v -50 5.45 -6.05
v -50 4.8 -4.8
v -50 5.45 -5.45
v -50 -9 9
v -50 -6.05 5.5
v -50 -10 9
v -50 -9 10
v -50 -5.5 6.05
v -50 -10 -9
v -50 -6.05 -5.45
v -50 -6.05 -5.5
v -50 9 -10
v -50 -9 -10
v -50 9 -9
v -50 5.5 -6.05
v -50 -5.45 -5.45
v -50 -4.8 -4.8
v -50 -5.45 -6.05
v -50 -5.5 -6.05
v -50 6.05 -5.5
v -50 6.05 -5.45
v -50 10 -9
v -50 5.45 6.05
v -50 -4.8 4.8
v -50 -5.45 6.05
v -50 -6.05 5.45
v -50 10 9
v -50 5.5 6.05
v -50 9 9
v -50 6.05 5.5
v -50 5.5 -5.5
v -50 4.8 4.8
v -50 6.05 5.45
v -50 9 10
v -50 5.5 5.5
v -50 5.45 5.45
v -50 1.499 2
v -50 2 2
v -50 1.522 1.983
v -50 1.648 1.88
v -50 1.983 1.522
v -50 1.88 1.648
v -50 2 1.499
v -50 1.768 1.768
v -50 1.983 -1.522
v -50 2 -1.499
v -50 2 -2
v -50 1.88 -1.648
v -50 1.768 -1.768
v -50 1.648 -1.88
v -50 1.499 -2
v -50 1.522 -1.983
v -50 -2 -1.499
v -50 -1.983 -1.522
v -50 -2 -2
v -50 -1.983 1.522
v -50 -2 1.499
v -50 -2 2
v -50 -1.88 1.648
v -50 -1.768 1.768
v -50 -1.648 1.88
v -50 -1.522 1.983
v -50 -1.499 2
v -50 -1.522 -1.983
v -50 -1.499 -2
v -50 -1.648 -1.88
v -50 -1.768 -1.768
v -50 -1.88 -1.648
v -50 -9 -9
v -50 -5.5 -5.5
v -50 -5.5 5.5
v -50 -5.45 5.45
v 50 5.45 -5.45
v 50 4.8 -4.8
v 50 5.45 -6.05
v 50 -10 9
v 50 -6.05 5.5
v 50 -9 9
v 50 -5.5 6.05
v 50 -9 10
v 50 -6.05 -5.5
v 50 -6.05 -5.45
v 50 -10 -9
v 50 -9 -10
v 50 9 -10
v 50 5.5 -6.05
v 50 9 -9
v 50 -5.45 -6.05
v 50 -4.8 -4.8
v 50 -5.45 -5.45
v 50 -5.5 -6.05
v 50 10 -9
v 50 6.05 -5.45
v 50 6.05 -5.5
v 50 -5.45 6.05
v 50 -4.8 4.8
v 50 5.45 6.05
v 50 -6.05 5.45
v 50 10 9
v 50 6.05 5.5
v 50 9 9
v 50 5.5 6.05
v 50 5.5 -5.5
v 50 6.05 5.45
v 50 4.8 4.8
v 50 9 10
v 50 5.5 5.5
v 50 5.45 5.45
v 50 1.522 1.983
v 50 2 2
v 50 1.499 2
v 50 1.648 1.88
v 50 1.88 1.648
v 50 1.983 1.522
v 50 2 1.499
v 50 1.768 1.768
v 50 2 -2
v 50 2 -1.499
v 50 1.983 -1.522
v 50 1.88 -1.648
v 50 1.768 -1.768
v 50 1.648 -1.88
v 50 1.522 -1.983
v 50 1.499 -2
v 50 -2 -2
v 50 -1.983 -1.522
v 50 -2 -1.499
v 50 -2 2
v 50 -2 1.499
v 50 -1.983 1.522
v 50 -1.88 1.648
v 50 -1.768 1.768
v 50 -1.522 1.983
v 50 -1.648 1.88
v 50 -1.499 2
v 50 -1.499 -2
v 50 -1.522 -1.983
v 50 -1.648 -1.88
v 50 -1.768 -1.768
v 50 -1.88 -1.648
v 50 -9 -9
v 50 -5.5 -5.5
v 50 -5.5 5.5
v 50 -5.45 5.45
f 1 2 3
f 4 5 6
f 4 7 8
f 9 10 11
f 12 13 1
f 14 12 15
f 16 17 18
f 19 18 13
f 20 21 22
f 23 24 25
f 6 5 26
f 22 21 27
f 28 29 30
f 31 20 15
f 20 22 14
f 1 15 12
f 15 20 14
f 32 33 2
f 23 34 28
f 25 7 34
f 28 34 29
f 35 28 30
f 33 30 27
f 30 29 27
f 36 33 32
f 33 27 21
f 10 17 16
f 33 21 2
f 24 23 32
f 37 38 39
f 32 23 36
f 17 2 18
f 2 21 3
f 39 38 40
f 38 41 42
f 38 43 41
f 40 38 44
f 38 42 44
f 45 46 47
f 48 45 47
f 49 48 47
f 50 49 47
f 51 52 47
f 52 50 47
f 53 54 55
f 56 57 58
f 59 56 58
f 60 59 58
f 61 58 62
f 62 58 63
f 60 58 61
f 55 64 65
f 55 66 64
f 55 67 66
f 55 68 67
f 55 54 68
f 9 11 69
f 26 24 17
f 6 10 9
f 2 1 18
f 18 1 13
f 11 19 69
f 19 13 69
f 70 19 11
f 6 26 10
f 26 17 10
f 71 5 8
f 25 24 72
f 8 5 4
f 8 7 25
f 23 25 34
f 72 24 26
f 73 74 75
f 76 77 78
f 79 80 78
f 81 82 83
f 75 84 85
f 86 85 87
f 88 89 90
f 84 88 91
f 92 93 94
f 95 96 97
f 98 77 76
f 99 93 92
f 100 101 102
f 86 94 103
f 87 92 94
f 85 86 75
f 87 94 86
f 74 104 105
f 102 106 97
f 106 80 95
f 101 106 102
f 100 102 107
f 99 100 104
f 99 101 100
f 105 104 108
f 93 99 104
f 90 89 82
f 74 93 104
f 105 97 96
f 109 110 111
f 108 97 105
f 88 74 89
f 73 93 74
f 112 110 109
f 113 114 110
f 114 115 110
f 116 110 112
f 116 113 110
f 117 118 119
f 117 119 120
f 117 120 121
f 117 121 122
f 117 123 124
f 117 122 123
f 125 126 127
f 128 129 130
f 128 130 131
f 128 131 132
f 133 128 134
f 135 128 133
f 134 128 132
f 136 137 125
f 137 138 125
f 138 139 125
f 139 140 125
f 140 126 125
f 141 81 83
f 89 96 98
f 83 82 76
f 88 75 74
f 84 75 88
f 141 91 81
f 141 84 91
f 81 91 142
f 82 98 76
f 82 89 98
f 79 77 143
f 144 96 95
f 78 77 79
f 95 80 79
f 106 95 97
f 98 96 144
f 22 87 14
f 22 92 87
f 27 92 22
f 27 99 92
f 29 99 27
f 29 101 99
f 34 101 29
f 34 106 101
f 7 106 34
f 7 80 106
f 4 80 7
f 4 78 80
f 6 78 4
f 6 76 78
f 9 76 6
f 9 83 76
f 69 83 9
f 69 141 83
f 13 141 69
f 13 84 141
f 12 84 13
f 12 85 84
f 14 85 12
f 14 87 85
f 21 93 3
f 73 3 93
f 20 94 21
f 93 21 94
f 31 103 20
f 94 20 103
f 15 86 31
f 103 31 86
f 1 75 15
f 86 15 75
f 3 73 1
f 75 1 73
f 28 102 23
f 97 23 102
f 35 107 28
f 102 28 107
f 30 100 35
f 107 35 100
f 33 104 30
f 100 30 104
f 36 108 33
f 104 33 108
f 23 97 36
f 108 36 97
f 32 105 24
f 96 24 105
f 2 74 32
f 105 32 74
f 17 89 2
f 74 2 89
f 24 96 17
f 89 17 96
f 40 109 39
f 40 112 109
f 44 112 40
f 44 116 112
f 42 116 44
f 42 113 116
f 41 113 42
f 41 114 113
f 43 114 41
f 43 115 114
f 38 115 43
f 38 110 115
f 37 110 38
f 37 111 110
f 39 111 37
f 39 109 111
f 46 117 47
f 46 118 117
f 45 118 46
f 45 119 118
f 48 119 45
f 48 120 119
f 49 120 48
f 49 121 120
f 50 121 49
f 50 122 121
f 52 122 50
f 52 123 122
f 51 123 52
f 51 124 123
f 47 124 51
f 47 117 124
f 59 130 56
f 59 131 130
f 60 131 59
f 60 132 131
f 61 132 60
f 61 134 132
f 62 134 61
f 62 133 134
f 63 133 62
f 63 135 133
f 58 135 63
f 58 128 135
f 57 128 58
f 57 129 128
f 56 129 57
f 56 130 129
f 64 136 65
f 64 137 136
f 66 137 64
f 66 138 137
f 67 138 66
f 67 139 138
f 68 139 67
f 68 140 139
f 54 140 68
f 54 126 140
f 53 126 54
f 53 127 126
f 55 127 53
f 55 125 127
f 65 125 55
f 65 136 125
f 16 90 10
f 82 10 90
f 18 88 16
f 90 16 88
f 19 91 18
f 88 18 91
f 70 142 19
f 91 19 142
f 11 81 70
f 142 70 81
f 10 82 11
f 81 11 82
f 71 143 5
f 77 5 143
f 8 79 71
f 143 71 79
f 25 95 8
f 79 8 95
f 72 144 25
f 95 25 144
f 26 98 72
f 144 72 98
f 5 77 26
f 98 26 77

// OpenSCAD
// 2020 aluminium extrusion profile (20mm x 20mm), 100mm long
// Fixed structural connectivity: ensure one connected solid (no split/floating bodies)

$fn = 96;

// Requested overall size
cross_section_mm = 20.0;
length_mm        = 100.0;

// Profile details (approximate 2020)
slot_opening_mm   = 6.0;   // mouth width at outer face
slot_depth_mm     = 6.0;   // depth from outer face inward
slot_cavity_mm    = 11.0;  // wider internal cavity width
center_bore_d_mm  = 5.0;   // center through-bore
web_thickness_mm  = 2.0;   // keeps part connected
corner_relief_mm  = 1.0;   // small corner relief

// Overlap to guarantee physical connection (1-2mm as required)
overlap_mm = 1.2;

// Small numeric epsilon for robust booleans
eps = 0.05;

module extrusion2020(len=length_mm) {
    w = cross_section_mm;
    h = cross_section_mm;

    half_w = w/2;
    half_h = h/2;

    mouth_w = slot_opening_mm;
    depth   = slot_depth_mm;
    cav_w   = slot_cavity_mm;

    // Clamp cavity width so it stays inside the profile
    cav_w_clamped = min(cav_w, w - 2*web_thickness_mm);

    // Cavity begins behind the mouth to suggest a "T" undercut
    cav_start = max(0, depth - web_thickness_mm);
    cav_len   = max(0, half_w - web_thickness_mm - cav_start);

    // Build as a 2D cross-section in XY, then extrude along Z,
    // then rotate so final length is along X.
    rotate([0, 90, 0])  // Z-length -> X-length
    linear_extrude(height=len, center=true, convexity=10)
    union() {
        // Main body with cuts
        difference() {
            // Outer square
            square([w, h], center=true);

            // Center bore (2D circle, extruded)
            circle(d=center_bore_d_mm);

            // Four T-slots (2D cuts)
            for (a = [0, 90, 180, 270]) {
                rotate(a) {
                    // Mouth: rectangle from outer face inward by 'depth'
                    translate([half_w - depth/2 + eps/2, 0])
                        square([depth + eps, mouth_w], center=true);

                    // Internal cavity: wider region behind the mouth
                    if (cav_len > 0) {
                        translate([half_w - (cav_start + cav_len/2) + eps/2, 0])
                            square([cav_len + eps, cav_w_clamped], center=true);
                    }
                }
            }

            // Corner reliefs (small squares removed at corners)
            for (sx = [-1, 1], sy = [-1, 1]) {
                translate([sx*(half_w - corner_relief_mm/2),
                           sy*(half_h - corner_relief_mm/2)])
                    square([corner_relief_mm, corner_relief_mm], center=true);
            }
        }

        // Connectivity bridges:
        // Add thin internal webs that slightly overlap into the slot cavities.
        // This prevents the profile from becoming two long parallel bodies with a gap.
        //
        // Place bridges at the center, spanning across the internal cavity region.
        // Width is small to preserve the look, but enough to guarantee a single solid.
        bridge_thick = web_thickness_mm; // ~2mm
        bridge_span  = cav_w_clamped - 2*eps; // stay inside cavity width

        // Along +X/-X directions (in 2D cross-section coordinates)
        // Position so it intersects the remaining material by overlap_mm.
        // The bridge extends from just inside the cavity toward the center.
        for (a = [0, 90, 180, 270]) {
            rotate(a) {
                // Bridge length: from near cavity start toward center, with overlap into solid
                // Ensure it reaches past the cavity start by overlap_mm.
                bridge_len = max(bridge_thick, cav_start + overlap_mm);

                // Center the bridge so its outer end sits inside the cavity region,
                // and its inner end overlaps the central material.
                // Outer face is at +half_w; cavity begins at (half_w - cav_start).
                // Put bridge centered at radius: (half_w - (cav_start/2)) so it spans inward.
                translate([half_w - (cav_start/2) - overlap_mm/2, 0])
                    square([bridge_len, bridge_span], center=true);
            }
        }
    }
}

extrusion2020(length_mm);
